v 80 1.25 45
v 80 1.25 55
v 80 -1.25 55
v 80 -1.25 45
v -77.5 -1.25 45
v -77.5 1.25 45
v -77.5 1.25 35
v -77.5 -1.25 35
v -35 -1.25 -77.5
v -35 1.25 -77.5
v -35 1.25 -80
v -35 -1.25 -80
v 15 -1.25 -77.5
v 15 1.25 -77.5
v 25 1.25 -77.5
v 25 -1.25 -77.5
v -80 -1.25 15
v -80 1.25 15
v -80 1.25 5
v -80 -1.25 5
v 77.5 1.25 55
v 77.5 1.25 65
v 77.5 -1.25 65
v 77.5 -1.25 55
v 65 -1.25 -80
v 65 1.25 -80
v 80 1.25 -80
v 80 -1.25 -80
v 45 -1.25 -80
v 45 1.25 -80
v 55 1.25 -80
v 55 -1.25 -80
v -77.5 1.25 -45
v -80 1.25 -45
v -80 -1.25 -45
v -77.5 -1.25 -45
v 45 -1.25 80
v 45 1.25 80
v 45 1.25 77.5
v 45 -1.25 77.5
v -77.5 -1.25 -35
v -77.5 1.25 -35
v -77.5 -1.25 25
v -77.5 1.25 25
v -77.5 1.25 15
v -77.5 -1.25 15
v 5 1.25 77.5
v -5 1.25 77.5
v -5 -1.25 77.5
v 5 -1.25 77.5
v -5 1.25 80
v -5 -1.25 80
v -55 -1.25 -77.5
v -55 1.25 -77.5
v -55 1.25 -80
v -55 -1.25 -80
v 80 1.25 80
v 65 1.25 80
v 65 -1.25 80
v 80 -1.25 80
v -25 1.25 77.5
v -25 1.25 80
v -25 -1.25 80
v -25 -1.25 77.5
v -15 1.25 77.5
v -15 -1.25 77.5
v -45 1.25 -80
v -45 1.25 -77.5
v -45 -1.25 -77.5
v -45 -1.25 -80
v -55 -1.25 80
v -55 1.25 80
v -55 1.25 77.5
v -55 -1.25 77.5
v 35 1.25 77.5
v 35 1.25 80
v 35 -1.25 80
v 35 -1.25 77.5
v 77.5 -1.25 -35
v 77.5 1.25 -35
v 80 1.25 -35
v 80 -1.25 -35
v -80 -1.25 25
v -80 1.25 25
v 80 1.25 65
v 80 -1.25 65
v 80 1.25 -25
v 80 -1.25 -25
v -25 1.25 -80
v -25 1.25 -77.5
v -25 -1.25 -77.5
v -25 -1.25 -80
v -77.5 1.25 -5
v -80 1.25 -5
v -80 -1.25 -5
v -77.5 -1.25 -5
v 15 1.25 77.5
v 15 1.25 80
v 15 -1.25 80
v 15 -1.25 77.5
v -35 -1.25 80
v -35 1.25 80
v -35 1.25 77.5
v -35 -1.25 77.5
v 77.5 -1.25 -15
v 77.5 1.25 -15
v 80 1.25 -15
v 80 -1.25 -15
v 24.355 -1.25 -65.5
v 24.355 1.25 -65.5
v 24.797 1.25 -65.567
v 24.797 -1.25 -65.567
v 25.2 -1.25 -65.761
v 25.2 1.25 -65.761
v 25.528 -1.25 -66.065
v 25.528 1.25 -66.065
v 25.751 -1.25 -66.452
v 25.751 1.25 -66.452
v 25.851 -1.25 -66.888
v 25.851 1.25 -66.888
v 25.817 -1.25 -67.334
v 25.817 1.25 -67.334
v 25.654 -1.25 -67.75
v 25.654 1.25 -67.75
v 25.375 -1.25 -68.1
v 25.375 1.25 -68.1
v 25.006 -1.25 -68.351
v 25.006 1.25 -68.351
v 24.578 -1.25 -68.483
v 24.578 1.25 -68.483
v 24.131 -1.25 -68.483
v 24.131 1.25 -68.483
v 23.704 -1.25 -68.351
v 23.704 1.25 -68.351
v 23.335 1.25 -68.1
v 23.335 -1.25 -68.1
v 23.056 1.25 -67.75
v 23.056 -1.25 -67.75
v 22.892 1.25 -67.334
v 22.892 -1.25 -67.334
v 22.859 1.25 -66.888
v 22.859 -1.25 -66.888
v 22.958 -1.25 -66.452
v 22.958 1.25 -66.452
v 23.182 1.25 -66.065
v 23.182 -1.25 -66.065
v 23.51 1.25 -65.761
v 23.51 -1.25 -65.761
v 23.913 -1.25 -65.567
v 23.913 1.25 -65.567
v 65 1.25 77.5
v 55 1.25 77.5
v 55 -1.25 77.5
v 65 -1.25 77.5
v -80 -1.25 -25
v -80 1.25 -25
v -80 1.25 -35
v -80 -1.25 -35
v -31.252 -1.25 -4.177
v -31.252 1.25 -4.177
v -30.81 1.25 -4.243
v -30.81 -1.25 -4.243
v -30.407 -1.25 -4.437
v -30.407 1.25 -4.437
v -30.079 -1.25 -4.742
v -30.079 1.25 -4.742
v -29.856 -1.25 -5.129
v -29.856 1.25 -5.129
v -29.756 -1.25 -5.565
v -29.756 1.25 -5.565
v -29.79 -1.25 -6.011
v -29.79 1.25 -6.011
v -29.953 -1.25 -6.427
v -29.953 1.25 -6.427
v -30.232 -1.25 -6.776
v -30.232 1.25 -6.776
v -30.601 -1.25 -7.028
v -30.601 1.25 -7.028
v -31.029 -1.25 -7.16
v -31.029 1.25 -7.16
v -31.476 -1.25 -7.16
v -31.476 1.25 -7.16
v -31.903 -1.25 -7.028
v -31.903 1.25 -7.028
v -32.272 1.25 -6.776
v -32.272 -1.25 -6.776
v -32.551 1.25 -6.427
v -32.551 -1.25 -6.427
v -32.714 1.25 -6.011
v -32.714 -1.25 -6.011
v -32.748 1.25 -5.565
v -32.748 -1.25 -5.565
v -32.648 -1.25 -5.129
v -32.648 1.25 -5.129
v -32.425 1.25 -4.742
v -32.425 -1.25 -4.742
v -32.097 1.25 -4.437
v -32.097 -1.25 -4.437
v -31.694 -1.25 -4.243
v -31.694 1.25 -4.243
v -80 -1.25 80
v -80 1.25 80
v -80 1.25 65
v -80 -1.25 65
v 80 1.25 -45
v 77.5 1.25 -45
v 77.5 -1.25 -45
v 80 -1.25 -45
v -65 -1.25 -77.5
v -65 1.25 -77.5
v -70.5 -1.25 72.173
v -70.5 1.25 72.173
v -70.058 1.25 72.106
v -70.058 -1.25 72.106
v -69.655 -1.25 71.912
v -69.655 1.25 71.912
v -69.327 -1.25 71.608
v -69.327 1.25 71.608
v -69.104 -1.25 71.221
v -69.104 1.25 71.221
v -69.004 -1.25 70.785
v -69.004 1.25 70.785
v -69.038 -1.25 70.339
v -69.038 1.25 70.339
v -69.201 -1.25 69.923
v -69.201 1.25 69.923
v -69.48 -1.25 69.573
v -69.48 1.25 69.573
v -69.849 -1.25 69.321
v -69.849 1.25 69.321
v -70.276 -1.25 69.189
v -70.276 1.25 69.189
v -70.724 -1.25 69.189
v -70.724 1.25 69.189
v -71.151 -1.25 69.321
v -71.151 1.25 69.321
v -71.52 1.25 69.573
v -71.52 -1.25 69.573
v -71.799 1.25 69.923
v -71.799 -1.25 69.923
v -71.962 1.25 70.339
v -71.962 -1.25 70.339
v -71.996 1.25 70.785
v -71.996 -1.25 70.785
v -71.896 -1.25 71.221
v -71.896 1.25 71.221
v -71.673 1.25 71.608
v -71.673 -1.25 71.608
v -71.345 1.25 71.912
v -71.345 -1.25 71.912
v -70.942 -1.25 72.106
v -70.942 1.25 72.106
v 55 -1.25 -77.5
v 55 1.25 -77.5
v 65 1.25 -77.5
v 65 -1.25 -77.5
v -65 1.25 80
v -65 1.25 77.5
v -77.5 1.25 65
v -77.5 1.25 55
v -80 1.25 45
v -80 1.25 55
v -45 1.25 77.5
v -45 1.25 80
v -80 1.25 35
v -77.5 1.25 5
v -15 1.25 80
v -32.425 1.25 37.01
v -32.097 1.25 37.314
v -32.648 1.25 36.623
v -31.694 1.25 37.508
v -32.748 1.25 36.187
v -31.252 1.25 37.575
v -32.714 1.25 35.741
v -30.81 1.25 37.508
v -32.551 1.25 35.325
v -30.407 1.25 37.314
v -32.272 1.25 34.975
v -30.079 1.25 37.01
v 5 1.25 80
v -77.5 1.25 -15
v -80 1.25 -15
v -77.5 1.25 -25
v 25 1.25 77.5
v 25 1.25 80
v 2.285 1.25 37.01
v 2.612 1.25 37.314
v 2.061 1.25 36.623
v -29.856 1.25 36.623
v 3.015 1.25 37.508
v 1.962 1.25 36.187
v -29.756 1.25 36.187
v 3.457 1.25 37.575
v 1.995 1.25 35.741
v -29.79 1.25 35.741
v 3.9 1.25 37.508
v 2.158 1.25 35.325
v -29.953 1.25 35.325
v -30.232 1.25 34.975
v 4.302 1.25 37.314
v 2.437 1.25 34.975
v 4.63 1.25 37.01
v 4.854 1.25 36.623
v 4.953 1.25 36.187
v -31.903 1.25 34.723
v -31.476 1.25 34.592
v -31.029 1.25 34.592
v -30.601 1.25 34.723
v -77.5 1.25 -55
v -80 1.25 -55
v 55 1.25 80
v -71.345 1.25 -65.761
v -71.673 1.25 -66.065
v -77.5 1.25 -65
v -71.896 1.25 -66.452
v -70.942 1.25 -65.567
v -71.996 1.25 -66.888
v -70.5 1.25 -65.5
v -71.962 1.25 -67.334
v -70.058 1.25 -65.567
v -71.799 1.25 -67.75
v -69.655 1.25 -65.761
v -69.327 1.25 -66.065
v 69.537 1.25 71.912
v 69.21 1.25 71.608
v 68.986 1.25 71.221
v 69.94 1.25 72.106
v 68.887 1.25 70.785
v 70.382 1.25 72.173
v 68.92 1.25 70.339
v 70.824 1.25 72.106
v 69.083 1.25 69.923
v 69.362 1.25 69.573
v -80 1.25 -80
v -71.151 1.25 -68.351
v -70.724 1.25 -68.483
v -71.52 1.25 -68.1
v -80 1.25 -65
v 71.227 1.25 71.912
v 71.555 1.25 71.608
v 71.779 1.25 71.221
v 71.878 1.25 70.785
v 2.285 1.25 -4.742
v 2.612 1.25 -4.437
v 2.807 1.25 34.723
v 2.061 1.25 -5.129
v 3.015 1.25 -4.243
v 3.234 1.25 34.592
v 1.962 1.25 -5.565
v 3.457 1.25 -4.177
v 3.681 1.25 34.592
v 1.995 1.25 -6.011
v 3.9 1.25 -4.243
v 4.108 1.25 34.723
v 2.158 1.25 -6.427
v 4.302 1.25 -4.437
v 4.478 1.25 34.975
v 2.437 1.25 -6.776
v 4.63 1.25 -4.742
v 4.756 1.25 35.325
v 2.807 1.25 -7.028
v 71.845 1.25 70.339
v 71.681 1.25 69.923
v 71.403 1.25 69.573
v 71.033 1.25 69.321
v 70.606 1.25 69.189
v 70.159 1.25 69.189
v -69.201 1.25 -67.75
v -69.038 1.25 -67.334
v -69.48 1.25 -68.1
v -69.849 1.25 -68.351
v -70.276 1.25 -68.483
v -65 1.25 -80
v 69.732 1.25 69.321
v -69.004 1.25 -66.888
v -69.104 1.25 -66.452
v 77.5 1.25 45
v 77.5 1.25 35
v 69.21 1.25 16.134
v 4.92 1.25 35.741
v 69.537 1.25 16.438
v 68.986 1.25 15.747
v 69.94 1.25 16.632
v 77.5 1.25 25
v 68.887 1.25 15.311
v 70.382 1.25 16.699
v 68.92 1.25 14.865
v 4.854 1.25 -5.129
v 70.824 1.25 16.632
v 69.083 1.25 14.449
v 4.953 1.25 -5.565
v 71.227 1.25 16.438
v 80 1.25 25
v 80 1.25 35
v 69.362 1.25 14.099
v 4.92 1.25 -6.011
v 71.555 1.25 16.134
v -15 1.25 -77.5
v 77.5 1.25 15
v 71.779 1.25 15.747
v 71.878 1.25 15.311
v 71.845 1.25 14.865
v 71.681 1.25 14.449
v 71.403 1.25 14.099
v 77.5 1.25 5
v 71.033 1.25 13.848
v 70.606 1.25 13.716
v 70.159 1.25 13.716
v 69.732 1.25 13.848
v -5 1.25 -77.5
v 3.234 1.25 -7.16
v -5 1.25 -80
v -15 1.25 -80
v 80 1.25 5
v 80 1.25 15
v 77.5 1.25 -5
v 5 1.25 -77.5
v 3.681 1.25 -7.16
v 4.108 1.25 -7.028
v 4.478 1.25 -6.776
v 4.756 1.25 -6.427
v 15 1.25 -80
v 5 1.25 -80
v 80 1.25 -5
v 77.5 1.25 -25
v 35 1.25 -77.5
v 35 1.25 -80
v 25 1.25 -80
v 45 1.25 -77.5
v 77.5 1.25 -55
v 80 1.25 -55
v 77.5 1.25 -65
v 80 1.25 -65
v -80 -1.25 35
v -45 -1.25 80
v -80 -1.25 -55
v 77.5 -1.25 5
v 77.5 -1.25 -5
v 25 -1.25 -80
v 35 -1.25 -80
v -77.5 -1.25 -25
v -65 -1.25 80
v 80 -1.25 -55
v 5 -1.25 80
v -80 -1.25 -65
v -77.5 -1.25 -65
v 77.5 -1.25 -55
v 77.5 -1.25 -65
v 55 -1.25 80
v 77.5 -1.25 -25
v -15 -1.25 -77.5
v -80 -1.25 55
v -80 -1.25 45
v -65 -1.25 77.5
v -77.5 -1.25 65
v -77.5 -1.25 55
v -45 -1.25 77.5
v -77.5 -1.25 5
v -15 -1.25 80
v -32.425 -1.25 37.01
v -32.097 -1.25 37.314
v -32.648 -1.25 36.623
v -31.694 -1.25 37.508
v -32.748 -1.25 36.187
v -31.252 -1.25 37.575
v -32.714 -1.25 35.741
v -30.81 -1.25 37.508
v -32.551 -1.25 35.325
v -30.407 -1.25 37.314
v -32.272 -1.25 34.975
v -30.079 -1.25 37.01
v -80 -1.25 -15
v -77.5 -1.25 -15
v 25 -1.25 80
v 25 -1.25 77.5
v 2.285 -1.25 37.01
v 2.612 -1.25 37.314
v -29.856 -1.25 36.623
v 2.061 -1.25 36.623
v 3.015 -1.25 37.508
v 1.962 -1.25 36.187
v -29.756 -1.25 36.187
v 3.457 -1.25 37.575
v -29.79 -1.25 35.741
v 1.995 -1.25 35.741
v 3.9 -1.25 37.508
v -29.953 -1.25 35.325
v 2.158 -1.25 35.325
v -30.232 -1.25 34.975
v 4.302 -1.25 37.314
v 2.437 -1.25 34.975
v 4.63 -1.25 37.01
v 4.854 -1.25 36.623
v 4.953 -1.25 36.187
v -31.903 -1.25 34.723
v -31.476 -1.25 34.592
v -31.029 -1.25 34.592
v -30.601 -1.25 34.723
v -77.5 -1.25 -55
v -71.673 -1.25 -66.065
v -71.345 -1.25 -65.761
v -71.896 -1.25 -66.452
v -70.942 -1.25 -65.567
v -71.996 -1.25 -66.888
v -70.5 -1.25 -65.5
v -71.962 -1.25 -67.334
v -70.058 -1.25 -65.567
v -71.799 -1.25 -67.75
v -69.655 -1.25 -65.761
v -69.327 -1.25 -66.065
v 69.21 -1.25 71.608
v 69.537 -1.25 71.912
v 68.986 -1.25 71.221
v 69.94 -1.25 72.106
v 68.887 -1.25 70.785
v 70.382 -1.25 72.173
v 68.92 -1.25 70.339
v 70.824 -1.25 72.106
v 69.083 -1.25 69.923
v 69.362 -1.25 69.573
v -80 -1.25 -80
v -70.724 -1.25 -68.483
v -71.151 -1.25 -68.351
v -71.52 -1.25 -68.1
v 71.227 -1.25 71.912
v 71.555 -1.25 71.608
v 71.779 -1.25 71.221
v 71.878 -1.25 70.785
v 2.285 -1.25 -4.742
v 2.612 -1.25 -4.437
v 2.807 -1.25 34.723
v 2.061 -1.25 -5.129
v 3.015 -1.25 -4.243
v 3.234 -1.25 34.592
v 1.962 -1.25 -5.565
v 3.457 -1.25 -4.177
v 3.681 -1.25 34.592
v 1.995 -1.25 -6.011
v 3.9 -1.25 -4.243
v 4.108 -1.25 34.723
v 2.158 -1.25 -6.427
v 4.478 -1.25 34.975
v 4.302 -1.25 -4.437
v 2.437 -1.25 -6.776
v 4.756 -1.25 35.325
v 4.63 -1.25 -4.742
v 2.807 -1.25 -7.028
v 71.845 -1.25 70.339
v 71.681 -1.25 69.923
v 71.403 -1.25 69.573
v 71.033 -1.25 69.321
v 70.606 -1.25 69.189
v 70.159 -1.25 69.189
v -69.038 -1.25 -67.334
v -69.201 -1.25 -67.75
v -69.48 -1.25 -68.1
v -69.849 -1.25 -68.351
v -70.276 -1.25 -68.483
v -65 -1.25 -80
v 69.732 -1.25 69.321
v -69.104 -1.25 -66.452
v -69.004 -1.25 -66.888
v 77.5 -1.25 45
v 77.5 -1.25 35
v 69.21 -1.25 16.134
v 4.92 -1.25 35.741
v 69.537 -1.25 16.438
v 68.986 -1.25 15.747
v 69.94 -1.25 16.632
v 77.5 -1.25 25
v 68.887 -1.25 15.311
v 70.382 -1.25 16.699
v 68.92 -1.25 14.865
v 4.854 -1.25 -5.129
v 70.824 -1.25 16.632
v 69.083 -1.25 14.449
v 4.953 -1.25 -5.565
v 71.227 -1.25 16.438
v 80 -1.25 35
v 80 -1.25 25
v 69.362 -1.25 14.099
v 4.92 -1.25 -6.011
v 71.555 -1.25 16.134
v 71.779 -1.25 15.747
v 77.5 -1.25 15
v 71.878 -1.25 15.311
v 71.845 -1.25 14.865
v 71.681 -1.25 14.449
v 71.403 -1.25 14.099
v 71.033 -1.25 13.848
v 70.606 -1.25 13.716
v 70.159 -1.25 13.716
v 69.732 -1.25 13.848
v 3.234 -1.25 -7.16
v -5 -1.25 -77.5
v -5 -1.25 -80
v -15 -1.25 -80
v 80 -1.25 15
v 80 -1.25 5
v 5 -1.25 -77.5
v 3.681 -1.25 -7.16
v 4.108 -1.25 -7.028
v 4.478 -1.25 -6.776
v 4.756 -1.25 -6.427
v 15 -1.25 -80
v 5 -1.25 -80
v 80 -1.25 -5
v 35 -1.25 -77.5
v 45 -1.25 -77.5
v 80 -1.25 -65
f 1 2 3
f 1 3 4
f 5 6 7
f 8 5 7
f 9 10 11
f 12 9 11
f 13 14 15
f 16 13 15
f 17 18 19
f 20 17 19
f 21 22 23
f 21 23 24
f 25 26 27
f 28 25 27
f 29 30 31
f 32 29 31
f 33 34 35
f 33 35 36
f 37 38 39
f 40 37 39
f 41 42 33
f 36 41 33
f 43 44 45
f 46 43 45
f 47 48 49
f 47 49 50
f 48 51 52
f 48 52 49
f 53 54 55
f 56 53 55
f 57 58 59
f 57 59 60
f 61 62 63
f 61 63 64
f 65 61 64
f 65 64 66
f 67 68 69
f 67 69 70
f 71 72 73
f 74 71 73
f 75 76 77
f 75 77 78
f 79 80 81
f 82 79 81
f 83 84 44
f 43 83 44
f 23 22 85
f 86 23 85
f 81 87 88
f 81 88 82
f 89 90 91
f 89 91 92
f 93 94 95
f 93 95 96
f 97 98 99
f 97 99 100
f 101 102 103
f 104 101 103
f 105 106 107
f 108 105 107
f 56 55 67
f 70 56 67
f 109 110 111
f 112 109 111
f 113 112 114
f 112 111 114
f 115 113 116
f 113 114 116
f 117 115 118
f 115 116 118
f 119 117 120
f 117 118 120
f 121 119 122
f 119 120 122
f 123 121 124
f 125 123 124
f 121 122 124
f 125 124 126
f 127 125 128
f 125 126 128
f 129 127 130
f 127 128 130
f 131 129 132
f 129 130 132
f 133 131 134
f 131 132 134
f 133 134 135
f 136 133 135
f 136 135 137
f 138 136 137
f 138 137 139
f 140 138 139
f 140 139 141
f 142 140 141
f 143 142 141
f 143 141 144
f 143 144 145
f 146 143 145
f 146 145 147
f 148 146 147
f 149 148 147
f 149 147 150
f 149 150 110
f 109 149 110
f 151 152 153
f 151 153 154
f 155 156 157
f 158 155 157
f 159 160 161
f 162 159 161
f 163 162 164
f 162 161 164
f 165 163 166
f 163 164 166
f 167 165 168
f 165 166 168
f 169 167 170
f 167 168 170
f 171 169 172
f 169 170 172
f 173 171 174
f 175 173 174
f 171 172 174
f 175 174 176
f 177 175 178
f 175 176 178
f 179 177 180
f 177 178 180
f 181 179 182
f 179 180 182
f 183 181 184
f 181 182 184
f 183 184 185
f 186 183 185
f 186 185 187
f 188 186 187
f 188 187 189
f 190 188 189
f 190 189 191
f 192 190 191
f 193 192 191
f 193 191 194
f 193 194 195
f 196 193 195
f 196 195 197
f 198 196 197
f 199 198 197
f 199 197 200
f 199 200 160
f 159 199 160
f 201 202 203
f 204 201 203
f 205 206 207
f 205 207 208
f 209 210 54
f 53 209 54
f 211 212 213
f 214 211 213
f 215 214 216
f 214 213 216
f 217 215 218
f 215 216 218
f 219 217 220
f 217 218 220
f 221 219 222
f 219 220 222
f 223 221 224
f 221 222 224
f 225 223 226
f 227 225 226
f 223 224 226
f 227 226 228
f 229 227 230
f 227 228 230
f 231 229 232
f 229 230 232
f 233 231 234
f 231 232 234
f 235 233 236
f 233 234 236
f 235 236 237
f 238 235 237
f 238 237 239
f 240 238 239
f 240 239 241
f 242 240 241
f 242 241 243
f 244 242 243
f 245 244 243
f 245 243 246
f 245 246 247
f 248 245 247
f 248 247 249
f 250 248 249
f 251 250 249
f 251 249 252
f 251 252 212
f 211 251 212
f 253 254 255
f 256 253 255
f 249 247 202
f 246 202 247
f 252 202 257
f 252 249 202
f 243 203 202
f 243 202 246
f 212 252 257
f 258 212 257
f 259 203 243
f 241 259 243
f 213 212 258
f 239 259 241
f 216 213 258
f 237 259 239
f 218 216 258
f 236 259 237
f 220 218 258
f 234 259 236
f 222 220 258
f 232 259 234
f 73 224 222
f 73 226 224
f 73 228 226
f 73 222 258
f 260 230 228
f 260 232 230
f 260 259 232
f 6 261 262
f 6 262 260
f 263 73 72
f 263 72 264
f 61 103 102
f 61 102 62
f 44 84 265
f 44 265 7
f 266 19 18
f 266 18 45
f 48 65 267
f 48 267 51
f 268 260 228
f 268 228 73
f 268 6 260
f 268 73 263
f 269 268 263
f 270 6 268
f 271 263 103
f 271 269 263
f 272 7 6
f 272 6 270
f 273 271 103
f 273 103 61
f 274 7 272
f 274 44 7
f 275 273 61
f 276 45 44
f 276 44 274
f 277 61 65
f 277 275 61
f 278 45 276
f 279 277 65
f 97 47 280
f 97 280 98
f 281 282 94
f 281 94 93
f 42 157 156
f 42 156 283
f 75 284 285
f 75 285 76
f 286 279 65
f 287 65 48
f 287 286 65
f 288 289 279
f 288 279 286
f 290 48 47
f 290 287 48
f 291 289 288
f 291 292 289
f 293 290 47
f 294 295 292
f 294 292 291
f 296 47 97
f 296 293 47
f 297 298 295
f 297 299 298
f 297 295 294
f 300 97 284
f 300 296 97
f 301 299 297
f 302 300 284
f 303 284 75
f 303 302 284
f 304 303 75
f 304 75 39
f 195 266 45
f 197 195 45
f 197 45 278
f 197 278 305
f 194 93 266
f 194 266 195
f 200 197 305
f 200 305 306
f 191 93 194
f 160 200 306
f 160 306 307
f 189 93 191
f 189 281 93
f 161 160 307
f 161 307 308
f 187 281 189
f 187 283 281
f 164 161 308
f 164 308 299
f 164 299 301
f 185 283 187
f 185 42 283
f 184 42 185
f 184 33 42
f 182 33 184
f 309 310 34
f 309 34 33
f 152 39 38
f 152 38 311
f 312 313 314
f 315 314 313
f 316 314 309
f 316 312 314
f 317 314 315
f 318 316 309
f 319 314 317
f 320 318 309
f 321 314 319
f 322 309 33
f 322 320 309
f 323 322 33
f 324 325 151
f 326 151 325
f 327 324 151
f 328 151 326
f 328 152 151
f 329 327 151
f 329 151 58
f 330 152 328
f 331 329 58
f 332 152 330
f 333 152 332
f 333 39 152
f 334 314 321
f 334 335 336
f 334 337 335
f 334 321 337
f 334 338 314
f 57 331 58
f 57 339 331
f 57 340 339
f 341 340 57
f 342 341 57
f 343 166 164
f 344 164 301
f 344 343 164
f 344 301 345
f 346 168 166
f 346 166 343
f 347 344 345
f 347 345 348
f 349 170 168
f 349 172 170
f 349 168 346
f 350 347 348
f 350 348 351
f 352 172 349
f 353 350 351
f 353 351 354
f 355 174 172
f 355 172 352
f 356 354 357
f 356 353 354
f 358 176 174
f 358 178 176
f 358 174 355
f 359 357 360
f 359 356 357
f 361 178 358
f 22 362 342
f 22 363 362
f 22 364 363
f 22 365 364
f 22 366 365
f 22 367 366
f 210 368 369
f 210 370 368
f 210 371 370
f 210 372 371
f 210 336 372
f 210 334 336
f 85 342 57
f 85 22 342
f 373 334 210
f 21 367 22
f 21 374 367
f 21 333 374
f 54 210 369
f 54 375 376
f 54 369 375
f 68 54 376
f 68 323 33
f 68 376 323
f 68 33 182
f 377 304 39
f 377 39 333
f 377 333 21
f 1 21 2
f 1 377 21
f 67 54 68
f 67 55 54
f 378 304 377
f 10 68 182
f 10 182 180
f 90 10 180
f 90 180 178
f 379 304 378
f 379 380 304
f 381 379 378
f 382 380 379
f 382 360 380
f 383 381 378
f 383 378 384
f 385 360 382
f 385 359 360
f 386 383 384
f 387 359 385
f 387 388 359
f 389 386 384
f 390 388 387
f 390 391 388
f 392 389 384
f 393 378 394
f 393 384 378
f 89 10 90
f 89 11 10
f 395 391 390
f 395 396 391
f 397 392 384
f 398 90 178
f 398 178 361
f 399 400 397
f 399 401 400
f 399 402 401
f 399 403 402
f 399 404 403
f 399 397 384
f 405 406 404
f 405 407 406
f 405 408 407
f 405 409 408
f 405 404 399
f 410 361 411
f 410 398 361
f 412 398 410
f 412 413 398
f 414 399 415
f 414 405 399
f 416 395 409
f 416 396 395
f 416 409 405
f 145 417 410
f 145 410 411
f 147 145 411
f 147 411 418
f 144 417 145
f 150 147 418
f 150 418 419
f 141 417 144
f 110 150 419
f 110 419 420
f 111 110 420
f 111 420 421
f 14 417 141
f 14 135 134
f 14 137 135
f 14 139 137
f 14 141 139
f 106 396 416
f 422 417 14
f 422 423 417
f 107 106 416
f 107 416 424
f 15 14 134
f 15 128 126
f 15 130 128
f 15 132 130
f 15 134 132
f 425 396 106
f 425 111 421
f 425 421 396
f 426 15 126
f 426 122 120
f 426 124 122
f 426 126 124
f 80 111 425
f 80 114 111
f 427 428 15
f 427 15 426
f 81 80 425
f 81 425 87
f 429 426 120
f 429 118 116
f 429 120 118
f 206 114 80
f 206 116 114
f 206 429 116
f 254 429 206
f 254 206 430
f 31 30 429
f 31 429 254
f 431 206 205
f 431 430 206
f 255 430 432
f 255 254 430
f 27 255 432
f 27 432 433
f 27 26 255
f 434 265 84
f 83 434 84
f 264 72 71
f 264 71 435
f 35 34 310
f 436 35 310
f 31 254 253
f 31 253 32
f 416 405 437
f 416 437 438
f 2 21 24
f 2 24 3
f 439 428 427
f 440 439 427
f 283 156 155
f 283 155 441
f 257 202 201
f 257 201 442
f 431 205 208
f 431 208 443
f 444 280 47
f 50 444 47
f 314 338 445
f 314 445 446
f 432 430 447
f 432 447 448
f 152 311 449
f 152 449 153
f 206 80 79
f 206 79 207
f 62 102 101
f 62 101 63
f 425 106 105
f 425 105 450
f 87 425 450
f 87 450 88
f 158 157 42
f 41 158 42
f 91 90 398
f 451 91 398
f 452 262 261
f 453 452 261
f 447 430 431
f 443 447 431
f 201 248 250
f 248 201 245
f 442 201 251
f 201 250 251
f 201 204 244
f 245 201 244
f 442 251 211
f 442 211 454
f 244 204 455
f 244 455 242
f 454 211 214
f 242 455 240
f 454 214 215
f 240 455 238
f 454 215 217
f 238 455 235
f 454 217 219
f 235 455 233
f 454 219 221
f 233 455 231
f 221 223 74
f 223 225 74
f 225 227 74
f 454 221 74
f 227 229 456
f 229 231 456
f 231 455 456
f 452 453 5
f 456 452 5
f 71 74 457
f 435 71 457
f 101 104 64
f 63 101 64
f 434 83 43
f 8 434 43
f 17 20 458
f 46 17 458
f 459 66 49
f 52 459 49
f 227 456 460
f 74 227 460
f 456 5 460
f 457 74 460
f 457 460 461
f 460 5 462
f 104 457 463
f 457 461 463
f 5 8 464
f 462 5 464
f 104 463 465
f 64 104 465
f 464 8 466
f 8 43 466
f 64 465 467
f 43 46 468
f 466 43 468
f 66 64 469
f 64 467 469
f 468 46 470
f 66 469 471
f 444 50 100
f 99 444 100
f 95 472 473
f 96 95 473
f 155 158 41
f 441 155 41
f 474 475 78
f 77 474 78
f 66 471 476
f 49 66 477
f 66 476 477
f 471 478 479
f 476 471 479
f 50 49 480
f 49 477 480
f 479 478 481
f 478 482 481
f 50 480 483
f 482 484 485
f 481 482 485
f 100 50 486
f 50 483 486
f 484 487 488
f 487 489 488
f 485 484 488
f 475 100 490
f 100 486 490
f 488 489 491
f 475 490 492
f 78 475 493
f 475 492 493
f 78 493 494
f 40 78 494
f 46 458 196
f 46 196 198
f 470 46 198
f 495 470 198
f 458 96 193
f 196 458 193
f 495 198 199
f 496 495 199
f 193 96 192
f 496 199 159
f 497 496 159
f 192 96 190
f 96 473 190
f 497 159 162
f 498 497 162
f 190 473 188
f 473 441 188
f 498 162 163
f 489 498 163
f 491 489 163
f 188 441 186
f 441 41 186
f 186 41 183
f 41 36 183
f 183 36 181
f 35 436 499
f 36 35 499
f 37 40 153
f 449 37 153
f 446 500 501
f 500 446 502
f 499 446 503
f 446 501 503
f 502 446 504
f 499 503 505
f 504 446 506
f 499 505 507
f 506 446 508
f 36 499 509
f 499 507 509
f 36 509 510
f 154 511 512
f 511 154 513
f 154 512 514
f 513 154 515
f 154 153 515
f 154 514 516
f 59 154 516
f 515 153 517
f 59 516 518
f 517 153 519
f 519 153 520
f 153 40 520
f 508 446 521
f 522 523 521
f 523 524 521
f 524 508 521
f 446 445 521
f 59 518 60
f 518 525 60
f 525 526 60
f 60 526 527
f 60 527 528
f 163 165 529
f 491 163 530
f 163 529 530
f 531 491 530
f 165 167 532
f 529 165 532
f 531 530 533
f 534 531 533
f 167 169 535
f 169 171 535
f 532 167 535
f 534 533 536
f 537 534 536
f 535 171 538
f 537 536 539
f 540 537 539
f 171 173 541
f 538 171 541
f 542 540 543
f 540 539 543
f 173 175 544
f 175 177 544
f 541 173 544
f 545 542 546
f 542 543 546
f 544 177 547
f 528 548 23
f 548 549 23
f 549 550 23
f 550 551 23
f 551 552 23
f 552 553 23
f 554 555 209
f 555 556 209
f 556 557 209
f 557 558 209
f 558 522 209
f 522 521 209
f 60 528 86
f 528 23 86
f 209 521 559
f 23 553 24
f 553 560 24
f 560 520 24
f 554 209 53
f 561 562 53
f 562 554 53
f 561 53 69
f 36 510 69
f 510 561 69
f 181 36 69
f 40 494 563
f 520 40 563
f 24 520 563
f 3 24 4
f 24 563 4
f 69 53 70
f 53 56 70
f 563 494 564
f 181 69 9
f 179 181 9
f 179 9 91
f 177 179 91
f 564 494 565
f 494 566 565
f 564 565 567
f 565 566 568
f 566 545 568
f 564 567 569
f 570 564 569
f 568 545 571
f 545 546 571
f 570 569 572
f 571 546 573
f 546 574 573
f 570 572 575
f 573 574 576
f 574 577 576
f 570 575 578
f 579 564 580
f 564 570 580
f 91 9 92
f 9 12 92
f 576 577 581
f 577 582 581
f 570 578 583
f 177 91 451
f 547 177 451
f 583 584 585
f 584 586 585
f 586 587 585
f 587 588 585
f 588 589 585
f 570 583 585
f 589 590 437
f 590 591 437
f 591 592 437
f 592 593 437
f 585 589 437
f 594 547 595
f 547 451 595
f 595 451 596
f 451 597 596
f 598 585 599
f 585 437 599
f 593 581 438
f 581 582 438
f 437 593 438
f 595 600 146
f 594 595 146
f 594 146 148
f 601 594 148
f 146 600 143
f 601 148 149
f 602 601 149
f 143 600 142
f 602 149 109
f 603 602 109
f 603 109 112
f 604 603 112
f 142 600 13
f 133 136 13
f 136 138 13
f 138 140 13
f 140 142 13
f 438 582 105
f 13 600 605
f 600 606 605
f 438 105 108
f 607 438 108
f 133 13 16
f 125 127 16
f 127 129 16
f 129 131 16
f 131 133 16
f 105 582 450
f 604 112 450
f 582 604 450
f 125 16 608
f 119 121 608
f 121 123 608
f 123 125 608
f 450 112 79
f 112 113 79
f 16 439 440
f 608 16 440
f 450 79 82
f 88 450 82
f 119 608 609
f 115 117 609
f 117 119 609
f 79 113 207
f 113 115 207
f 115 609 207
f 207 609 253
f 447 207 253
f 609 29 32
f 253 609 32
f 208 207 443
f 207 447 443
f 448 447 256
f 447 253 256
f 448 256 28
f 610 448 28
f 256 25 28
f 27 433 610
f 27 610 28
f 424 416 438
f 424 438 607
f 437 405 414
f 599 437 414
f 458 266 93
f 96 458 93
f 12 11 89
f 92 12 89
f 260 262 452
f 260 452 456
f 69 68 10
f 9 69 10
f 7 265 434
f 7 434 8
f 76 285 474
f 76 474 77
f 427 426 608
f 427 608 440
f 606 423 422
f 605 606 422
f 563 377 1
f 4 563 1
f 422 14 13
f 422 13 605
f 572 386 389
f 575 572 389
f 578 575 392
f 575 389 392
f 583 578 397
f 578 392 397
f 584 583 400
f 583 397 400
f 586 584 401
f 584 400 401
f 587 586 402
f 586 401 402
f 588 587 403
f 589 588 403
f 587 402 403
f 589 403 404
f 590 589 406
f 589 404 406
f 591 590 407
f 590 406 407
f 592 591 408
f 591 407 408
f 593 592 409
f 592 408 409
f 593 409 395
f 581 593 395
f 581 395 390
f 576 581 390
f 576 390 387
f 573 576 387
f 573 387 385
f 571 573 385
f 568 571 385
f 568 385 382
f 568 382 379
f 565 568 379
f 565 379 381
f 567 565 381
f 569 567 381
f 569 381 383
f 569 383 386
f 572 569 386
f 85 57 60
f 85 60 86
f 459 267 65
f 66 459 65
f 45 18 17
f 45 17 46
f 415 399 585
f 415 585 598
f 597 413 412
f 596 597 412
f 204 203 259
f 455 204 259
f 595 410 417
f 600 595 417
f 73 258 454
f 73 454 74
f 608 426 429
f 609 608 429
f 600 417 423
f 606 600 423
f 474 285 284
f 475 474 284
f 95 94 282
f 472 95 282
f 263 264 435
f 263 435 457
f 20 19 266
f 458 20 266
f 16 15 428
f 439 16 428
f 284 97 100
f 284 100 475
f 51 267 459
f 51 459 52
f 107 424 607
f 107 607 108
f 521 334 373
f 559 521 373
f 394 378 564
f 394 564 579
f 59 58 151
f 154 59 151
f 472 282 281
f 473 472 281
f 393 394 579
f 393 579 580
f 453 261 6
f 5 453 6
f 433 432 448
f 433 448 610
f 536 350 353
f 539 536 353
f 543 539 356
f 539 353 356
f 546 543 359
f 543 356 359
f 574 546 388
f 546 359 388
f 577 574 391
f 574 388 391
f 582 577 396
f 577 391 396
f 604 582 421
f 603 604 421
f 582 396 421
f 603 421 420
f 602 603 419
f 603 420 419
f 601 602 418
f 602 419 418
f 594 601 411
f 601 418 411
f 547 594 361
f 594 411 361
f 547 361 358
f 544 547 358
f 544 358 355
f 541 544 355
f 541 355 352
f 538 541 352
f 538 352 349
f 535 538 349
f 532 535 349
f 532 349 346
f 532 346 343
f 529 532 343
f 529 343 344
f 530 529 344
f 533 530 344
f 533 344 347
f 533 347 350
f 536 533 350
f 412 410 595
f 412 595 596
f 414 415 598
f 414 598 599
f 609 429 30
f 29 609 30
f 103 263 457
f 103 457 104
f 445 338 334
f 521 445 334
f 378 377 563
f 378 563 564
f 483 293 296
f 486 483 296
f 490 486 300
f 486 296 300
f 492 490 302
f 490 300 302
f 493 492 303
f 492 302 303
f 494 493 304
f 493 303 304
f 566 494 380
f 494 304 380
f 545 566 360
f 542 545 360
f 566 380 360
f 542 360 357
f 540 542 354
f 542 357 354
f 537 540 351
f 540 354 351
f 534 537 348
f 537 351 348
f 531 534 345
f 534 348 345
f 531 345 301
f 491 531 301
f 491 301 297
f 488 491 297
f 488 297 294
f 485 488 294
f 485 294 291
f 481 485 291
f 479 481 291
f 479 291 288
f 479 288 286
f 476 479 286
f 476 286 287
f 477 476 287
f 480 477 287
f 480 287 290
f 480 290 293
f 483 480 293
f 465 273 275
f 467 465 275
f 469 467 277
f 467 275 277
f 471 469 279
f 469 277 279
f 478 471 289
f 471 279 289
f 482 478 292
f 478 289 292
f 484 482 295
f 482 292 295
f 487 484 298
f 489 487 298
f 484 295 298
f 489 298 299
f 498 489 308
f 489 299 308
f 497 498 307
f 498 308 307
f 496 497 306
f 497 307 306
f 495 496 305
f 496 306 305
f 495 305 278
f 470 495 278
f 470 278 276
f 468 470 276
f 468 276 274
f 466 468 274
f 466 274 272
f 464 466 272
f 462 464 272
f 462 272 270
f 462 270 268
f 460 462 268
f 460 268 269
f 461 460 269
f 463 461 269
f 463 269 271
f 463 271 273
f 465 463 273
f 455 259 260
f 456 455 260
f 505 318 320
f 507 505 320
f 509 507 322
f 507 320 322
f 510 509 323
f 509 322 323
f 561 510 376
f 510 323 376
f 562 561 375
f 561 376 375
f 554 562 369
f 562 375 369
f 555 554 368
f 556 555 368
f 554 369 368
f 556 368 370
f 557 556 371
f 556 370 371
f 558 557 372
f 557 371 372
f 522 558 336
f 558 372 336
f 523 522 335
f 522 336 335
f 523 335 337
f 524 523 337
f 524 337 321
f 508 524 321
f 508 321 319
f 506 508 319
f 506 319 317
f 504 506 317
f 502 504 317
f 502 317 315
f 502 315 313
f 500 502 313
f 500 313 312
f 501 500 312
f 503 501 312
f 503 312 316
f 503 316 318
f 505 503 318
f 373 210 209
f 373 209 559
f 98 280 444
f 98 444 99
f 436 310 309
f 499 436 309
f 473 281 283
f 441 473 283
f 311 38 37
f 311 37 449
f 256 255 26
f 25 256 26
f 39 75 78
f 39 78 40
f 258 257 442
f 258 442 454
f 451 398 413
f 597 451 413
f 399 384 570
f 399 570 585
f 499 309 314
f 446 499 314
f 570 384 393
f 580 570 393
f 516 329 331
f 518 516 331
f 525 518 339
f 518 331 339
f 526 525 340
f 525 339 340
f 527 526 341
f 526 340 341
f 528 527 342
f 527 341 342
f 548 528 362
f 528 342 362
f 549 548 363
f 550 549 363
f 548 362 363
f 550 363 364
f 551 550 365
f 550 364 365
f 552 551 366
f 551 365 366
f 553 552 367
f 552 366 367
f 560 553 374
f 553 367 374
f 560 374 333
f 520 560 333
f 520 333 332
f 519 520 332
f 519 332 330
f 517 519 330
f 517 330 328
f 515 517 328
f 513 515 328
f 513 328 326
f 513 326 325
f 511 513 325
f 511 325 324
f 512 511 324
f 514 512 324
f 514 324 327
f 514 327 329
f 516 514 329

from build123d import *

# Parameters (mm, degrees)
SKETCH1_W           = 160
SKETCH1_H           = 160
BOSS_EXTRUDE1_DEPTH = 1.25
SKETCH3_W           = 2.5
SKETCH3_H           = 10
SKETCH3_W_2         = 10
SKETCH3_H_2         = 2.5
CUT_EXTRUDE2_DEPTH  = 114.164702978
SKETCH2_R           = 1.5
CUT_EXTRUDE1_DEPTH  = 114.164702978


with BuildPart() as part:
    # Sketch1 → Boss-Extrude1 (new, symmetric)
    with BuildSketch(Plane(origin=(0, 0, 0), x_dir=(1, 0, 0), z_dir=(0, 1, 0))):
        Rectangle(SKETCH1_W, SKETCH1_H)
    extrude(amount=BOSS_EXTRUDE1_DEPTH, both=True)

    # Sketch3 → Cut-Extrude2 (cut, through all)
    with BuildSketch(Plane(origin=(0, 1.25, 0), x_dir=(1, 0, 0), z_dir=(0, 1, 0))):
        with Locations((-78.75, 60)):
            Rectangle(SKETCH3_W, SKETCH3_H)
        with Locations((-78.75, 40)):
            Rectangle(SKETCH3_W, SKETCH3_H)
        with Locations((-78.75, 20)):
            Rectangle(SKETCH3_W, SKETCH3_H)
        with Locations((-78.75, 0)):
            Rectangle(SKETCH3_W, SKETCH3_H)
        with Locations((-78.75, -20)):
            Rectangle(SKETCH3_W, SKETCH3_H)
        with Locations((-78.75, -40)):
            Rectangle(SKETCH3_W, SKETCH3_H)
        with Locations((-78.75, -60)):
            Rectangle(SKETCH3_W, SKETCH3_H)
        with Locations((-60, -78.75)):
            Rectangle(SKETCH3_W_2, SKETCH3_H_2)
        with Locations((-40, -78.75)):
            Rectangle(SKETCH3_W_2, SKETCH3_H_2)
        with Locations((-20, -78.75)):
            Rectangle(SKETCH3_W_2, SKETCH3_H_2)
        with Locations((0, -78.75)):
            Rectangle(SKETCH3_W_2, SKETCH3_H_2)
        with Locations((20, -78.75)):
            Rectangle(SKETCH3_W_2, SKETCH3_H_2)
        with Locations((40, -78.75)):
            Rectangle(SKETCH3_W_2, SKETCH3_H_2)
        with Locations((60, -78.75)):
            Rectangle(SKETCH3_W_2, SKETCH3_H_2)
        with Locations((78.75, -60)):
            Rectangle(SKETCH3_W, SKETCH3_H)
        with Locations((78.75, 40)):
            Rectangle(SKETCH3_W, SKETCH3_H)
        with Locations((78.75, 20)):
            Rectangle(SKETCH3_W, SKETCH3_H)
        with Locations((78.75, 0)):
            Rectangle(SKETCH3_W, SKETCH3_H)
        with Locations((78.75, -20)):
            Rectangle(SKETCH3_W, SKETCH3_H)
        with Locations((78.75, -40)):
            Rectangle(SKETCH3_W, SKETCH3_H)
        with Locations((60, 78.75)):
            Rectangle(SKETCH3_W_2, SKETCH3_H_2)
        with Locations((40, 78.75)):
            Rectangle(SKETCH3_W_2, SKETCH3_H_2)
        with Locations((20, 78.75)):
            Rectangle(SKETCH3_W_2, SKETCH3_H_2)
        with Locations((0, 78.75)):
            Rectangle(SKETCH3_W_2, SKETCH3_H_2)
        with Locations((-20, 78.75)):
            Rectangle(SKETCH3_W_2, SKETCH3_H_2)
        with Locations((-40, 78.75)):
            Rectangle(SKETCH3_W_2, SKETCH3_H_2)
        with Locations((-60, 78.75)):
            Rectangle(SKETCH3_W_2, SKETCH3_H_2)
        with Locations((78.75, 60)):
            Rectangle(SKETCH3_W, SKETCH3_H)
    extrude(amount=-CUT_EXTRUDE2_DEPTH, mode=Mode.SUBTRACT)

    # Sketch2 → Cut-Extrude1 (cut, through all)
    with BuildSketch(Plane(origin=(0, 1.25, 0), x_dir=(1, 0, 0), z_dir=(0, 1, 0))):
        with Locations(Location((24.35481, 66.99998, 0), (0, 0, 270))):
            Circle(SKETCH2_R)
        with Locations(Location((-70.50001, 66.99998, 0), (0, 0, 270))):
            Circle(SKETCH2_R)
        with Locations(Location((70.38235, -15.19905, 0), (0, 0, 270))):
            Circle(SKETCH2_R)
        with Locations(Location((-31.25208, 5.67683, 0), (0, 0, 270))):
            Circle(SKETCH2_R)
        with Locations(Location((3.45737, 5.67683, 0), (0, 0, 270))):
            Circle(SKETCH2_R)
        with Locations(Location((3.45737, -36.07493, 0), (0, 0, 270))):
            Circle(SKETCH2_R)
        with Locations(Location((-70.50001, -70.67262, 0), (0, 0, 270))):
            Circle(SKETCH2_R)
        with Locations(Location((-31.25208, -36.07493, 0), (0, 0, 270))):
            Circle(SKETCH2_R)
        with Locations(Location((70.38235, -70.67262, 0), (0, 0, 270))):
            Circle(SKETCH2_R)
    extrude(amount=-CUT_EXTRUDE1_DEPTH, mode=Mode.SUBTRACT)


solid = part.part
